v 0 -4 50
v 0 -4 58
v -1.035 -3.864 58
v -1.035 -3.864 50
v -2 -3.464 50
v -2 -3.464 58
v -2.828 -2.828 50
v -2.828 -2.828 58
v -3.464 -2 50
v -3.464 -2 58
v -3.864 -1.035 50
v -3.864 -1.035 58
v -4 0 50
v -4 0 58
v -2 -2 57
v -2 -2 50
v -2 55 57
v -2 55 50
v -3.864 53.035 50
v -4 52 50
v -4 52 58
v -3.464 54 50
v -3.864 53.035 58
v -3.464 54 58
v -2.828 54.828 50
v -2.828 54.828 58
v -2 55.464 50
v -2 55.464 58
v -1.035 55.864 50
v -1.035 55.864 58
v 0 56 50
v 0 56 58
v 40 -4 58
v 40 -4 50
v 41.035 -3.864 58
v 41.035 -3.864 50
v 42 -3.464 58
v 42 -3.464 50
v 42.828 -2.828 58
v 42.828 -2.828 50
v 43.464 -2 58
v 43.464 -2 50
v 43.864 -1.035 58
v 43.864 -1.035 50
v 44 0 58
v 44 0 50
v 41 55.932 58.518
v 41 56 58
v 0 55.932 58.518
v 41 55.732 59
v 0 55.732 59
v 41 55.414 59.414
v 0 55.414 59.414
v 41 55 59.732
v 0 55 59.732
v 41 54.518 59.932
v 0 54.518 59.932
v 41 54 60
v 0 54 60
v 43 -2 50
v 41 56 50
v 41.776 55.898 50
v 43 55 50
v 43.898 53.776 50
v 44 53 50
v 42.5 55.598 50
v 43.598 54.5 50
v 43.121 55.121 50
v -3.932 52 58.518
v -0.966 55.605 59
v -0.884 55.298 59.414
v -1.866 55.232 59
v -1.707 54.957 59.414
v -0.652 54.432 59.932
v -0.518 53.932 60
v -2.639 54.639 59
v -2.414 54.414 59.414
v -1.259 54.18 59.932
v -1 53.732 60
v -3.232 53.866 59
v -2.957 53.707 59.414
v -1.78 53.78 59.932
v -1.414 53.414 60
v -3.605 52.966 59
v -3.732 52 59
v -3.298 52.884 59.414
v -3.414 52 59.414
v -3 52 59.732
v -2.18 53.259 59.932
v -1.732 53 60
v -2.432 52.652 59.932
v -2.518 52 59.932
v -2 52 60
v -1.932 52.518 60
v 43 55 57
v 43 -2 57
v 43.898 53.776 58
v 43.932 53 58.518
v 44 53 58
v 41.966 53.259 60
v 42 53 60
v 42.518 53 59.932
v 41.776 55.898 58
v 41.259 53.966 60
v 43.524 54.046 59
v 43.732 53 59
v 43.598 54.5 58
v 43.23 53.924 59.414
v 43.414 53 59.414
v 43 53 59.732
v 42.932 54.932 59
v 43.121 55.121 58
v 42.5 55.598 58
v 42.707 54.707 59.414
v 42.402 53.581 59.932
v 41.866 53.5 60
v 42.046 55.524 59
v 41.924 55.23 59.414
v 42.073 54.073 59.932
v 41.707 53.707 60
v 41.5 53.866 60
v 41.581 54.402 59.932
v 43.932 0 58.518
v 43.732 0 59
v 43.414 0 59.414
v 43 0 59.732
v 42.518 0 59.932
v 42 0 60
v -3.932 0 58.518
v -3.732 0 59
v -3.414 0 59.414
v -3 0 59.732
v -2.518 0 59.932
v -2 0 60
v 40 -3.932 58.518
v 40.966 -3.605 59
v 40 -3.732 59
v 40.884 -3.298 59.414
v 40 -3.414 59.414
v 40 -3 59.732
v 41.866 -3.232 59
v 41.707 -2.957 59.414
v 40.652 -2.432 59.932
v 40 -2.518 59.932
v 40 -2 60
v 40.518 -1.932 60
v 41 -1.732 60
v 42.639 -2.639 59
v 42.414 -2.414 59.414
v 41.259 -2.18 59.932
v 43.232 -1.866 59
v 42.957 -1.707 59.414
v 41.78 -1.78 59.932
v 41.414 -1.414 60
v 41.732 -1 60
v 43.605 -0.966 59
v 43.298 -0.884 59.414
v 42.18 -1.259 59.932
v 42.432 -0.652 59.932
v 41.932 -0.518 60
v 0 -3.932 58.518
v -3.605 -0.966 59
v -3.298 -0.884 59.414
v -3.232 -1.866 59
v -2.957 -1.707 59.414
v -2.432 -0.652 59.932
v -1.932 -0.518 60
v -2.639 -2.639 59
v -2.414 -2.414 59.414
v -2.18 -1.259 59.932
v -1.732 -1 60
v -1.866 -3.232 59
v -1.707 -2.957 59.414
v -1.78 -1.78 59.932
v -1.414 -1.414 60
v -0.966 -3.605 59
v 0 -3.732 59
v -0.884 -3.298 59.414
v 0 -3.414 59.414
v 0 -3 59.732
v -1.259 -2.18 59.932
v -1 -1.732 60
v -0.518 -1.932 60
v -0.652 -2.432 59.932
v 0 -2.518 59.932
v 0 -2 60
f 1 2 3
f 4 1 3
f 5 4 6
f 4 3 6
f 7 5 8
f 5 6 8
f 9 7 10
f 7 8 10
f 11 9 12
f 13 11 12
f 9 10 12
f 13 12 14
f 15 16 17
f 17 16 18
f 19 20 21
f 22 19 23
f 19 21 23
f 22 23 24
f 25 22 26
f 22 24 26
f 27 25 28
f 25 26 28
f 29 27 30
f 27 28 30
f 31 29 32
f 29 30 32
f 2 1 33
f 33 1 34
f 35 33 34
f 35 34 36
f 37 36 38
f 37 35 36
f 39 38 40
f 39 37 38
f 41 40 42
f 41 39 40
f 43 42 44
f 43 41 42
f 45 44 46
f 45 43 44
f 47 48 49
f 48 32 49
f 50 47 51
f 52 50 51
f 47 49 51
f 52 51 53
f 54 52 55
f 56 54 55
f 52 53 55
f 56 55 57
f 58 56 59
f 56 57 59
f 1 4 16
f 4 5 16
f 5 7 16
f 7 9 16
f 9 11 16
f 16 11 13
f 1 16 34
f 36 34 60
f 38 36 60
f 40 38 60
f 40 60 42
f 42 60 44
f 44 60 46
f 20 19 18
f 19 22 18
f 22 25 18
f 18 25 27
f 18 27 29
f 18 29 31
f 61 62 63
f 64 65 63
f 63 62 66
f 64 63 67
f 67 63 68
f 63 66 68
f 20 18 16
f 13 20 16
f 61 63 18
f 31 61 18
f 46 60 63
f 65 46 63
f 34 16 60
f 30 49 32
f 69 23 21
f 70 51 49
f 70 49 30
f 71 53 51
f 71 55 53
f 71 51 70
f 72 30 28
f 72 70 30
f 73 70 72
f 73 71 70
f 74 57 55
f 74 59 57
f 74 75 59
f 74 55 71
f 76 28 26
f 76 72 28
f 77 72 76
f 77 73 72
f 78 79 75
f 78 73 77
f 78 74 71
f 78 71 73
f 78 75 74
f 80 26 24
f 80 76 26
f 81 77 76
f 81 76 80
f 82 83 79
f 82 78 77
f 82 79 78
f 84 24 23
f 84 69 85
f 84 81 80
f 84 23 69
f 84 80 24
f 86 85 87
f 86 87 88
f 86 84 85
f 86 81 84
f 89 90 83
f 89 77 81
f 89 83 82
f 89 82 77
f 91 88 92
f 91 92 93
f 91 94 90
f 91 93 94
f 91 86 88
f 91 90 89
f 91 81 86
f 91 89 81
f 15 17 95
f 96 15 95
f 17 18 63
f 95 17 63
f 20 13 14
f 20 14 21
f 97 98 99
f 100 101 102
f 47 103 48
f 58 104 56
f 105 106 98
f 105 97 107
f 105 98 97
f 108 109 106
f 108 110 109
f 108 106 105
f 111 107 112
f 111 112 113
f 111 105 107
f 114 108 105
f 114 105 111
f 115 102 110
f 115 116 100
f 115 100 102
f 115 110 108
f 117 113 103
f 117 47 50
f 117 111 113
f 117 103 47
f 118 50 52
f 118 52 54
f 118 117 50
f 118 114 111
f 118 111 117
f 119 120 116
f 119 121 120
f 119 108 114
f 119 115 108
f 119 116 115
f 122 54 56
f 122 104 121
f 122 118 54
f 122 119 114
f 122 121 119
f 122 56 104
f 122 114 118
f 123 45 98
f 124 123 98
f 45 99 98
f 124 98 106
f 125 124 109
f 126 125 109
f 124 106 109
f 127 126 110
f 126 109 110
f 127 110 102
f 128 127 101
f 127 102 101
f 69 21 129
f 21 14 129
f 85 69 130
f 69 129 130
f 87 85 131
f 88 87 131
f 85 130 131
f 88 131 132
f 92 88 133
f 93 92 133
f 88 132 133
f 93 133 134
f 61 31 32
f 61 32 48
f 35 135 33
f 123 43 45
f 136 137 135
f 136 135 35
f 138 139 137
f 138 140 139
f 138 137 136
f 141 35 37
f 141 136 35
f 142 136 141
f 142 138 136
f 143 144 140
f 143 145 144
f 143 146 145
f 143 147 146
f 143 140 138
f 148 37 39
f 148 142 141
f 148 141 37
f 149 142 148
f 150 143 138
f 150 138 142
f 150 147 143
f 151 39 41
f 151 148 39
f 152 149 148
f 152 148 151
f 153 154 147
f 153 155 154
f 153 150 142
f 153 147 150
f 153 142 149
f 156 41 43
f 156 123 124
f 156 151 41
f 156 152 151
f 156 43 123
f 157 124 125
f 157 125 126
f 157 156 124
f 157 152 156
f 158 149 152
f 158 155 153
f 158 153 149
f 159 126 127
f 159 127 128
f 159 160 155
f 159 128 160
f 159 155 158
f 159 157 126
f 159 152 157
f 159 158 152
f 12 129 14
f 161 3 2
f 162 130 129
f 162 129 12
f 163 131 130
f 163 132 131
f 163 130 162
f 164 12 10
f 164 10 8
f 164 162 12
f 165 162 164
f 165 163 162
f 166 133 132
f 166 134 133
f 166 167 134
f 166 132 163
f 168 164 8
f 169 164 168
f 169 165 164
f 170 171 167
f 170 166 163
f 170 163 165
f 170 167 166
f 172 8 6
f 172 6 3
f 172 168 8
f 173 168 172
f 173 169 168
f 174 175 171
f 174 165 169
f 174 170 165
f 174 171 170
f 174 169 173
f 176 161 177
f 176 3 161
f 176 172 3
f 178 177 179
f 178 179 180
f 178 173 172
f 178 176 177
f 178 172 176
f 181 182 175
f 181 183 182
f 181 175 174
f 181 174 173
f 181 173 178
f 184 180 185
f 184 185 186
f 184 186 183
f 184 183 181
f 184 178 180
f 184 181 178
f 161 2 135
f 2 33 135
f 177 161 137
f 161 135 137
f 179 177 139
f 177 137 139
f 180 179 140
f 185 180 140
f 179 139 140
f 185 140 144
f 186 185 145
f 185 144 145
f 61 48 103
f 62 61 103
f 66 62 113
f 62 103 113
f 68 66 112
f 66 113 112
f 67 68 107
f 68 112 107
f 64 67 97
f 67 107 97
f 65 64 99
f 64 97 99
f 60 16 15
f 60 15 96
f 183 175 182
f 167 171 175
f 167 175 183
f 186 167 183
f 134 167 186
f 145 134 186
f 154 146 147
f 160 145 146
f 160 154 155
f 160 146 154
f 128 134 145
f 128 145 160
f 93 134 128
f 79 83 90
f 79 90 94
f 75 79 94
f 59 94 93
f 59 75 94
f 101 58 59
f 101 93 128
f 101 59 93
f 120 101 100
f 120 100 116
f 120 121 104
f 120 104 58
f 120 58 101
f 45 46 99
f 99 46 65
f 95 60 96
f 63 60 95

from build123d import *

# Parameters (mm, degrees)
BOX001_W     = 45
BOX001_H     = 57
BOX001_DEPTH = 11
BOX_W        = 48
BOX_H        = 60
BOX_DEPTH    = 10
FILLET004_R  = 4
FILLET005_R  = 4
FILLET006_R  = 4
FILLET007_R  = 3
FILLET008_R  = 2


with BuildPart() as box001:
    # Box001 → Box001 (new body)
    with BuildSketch(Plane(origin=(-2, -2, 46), x_dir=(1, 0, 0), z_dir=(0, 0, 1))):
        with Locations((22.5, 28.5)):
            Rectangle(BOX001_W, BOX001_H)
    extrude(amount=BOX001_DEPTH)


with BuildPart() as tapa001:
    # Box → Box (new body)
    with BuildSketch(Plane(origin=(-4, -4, 50), x_dir=(1, 0, 0), z_dir=(0, 0, 1))):
        with Locations((24, 30)):
            Rectangle(BOX_W, BOX_H)
    extrude(amount=BOX_DEPTH)

    # Cut: cut Box001
    add(box001.part, mode=Mode.SUBTRACT)

    # Fillet004
    fillet004_edges = [tapa001.edges().sort_by_distance(p)[0] for p in [
        (44, -4, 55),
    ]]
    fillet(fillet004_edges, radius=FILLET004_R)

    # Fillet005
    fillet005_edges = [tapa001.edges().sort_by_distance(p)[0] for p in [
        (-4, -4, 55),
    ]]
    fillet(fillet005_edges, radius=FILLET005_R)

    # Fillet006
    fillet006_edges = [tapa001.edges().sort_by_distance(p)[0] for p in [
        (-4, 56, 55),
    ]]
    fillet(fillet006_edges, radius=FILLET006_R)

    # Fillet007
    fillet007_edges = [tapa001.edges().sort_by_distance(p)[0] for p in [
        (44, 56, 55),
    ]]
    fillet(fillet007_edges, radius=FILLET007_R)

    # Fillet008
    fillet008_edges = [tapa001.edges().sort_by_distance(p)[0] for p in [
        (44, 26.5, 60),
    ]]
    fillet(fillet008_edges, radius=FILLET008_R)


solid = tapa001.part
